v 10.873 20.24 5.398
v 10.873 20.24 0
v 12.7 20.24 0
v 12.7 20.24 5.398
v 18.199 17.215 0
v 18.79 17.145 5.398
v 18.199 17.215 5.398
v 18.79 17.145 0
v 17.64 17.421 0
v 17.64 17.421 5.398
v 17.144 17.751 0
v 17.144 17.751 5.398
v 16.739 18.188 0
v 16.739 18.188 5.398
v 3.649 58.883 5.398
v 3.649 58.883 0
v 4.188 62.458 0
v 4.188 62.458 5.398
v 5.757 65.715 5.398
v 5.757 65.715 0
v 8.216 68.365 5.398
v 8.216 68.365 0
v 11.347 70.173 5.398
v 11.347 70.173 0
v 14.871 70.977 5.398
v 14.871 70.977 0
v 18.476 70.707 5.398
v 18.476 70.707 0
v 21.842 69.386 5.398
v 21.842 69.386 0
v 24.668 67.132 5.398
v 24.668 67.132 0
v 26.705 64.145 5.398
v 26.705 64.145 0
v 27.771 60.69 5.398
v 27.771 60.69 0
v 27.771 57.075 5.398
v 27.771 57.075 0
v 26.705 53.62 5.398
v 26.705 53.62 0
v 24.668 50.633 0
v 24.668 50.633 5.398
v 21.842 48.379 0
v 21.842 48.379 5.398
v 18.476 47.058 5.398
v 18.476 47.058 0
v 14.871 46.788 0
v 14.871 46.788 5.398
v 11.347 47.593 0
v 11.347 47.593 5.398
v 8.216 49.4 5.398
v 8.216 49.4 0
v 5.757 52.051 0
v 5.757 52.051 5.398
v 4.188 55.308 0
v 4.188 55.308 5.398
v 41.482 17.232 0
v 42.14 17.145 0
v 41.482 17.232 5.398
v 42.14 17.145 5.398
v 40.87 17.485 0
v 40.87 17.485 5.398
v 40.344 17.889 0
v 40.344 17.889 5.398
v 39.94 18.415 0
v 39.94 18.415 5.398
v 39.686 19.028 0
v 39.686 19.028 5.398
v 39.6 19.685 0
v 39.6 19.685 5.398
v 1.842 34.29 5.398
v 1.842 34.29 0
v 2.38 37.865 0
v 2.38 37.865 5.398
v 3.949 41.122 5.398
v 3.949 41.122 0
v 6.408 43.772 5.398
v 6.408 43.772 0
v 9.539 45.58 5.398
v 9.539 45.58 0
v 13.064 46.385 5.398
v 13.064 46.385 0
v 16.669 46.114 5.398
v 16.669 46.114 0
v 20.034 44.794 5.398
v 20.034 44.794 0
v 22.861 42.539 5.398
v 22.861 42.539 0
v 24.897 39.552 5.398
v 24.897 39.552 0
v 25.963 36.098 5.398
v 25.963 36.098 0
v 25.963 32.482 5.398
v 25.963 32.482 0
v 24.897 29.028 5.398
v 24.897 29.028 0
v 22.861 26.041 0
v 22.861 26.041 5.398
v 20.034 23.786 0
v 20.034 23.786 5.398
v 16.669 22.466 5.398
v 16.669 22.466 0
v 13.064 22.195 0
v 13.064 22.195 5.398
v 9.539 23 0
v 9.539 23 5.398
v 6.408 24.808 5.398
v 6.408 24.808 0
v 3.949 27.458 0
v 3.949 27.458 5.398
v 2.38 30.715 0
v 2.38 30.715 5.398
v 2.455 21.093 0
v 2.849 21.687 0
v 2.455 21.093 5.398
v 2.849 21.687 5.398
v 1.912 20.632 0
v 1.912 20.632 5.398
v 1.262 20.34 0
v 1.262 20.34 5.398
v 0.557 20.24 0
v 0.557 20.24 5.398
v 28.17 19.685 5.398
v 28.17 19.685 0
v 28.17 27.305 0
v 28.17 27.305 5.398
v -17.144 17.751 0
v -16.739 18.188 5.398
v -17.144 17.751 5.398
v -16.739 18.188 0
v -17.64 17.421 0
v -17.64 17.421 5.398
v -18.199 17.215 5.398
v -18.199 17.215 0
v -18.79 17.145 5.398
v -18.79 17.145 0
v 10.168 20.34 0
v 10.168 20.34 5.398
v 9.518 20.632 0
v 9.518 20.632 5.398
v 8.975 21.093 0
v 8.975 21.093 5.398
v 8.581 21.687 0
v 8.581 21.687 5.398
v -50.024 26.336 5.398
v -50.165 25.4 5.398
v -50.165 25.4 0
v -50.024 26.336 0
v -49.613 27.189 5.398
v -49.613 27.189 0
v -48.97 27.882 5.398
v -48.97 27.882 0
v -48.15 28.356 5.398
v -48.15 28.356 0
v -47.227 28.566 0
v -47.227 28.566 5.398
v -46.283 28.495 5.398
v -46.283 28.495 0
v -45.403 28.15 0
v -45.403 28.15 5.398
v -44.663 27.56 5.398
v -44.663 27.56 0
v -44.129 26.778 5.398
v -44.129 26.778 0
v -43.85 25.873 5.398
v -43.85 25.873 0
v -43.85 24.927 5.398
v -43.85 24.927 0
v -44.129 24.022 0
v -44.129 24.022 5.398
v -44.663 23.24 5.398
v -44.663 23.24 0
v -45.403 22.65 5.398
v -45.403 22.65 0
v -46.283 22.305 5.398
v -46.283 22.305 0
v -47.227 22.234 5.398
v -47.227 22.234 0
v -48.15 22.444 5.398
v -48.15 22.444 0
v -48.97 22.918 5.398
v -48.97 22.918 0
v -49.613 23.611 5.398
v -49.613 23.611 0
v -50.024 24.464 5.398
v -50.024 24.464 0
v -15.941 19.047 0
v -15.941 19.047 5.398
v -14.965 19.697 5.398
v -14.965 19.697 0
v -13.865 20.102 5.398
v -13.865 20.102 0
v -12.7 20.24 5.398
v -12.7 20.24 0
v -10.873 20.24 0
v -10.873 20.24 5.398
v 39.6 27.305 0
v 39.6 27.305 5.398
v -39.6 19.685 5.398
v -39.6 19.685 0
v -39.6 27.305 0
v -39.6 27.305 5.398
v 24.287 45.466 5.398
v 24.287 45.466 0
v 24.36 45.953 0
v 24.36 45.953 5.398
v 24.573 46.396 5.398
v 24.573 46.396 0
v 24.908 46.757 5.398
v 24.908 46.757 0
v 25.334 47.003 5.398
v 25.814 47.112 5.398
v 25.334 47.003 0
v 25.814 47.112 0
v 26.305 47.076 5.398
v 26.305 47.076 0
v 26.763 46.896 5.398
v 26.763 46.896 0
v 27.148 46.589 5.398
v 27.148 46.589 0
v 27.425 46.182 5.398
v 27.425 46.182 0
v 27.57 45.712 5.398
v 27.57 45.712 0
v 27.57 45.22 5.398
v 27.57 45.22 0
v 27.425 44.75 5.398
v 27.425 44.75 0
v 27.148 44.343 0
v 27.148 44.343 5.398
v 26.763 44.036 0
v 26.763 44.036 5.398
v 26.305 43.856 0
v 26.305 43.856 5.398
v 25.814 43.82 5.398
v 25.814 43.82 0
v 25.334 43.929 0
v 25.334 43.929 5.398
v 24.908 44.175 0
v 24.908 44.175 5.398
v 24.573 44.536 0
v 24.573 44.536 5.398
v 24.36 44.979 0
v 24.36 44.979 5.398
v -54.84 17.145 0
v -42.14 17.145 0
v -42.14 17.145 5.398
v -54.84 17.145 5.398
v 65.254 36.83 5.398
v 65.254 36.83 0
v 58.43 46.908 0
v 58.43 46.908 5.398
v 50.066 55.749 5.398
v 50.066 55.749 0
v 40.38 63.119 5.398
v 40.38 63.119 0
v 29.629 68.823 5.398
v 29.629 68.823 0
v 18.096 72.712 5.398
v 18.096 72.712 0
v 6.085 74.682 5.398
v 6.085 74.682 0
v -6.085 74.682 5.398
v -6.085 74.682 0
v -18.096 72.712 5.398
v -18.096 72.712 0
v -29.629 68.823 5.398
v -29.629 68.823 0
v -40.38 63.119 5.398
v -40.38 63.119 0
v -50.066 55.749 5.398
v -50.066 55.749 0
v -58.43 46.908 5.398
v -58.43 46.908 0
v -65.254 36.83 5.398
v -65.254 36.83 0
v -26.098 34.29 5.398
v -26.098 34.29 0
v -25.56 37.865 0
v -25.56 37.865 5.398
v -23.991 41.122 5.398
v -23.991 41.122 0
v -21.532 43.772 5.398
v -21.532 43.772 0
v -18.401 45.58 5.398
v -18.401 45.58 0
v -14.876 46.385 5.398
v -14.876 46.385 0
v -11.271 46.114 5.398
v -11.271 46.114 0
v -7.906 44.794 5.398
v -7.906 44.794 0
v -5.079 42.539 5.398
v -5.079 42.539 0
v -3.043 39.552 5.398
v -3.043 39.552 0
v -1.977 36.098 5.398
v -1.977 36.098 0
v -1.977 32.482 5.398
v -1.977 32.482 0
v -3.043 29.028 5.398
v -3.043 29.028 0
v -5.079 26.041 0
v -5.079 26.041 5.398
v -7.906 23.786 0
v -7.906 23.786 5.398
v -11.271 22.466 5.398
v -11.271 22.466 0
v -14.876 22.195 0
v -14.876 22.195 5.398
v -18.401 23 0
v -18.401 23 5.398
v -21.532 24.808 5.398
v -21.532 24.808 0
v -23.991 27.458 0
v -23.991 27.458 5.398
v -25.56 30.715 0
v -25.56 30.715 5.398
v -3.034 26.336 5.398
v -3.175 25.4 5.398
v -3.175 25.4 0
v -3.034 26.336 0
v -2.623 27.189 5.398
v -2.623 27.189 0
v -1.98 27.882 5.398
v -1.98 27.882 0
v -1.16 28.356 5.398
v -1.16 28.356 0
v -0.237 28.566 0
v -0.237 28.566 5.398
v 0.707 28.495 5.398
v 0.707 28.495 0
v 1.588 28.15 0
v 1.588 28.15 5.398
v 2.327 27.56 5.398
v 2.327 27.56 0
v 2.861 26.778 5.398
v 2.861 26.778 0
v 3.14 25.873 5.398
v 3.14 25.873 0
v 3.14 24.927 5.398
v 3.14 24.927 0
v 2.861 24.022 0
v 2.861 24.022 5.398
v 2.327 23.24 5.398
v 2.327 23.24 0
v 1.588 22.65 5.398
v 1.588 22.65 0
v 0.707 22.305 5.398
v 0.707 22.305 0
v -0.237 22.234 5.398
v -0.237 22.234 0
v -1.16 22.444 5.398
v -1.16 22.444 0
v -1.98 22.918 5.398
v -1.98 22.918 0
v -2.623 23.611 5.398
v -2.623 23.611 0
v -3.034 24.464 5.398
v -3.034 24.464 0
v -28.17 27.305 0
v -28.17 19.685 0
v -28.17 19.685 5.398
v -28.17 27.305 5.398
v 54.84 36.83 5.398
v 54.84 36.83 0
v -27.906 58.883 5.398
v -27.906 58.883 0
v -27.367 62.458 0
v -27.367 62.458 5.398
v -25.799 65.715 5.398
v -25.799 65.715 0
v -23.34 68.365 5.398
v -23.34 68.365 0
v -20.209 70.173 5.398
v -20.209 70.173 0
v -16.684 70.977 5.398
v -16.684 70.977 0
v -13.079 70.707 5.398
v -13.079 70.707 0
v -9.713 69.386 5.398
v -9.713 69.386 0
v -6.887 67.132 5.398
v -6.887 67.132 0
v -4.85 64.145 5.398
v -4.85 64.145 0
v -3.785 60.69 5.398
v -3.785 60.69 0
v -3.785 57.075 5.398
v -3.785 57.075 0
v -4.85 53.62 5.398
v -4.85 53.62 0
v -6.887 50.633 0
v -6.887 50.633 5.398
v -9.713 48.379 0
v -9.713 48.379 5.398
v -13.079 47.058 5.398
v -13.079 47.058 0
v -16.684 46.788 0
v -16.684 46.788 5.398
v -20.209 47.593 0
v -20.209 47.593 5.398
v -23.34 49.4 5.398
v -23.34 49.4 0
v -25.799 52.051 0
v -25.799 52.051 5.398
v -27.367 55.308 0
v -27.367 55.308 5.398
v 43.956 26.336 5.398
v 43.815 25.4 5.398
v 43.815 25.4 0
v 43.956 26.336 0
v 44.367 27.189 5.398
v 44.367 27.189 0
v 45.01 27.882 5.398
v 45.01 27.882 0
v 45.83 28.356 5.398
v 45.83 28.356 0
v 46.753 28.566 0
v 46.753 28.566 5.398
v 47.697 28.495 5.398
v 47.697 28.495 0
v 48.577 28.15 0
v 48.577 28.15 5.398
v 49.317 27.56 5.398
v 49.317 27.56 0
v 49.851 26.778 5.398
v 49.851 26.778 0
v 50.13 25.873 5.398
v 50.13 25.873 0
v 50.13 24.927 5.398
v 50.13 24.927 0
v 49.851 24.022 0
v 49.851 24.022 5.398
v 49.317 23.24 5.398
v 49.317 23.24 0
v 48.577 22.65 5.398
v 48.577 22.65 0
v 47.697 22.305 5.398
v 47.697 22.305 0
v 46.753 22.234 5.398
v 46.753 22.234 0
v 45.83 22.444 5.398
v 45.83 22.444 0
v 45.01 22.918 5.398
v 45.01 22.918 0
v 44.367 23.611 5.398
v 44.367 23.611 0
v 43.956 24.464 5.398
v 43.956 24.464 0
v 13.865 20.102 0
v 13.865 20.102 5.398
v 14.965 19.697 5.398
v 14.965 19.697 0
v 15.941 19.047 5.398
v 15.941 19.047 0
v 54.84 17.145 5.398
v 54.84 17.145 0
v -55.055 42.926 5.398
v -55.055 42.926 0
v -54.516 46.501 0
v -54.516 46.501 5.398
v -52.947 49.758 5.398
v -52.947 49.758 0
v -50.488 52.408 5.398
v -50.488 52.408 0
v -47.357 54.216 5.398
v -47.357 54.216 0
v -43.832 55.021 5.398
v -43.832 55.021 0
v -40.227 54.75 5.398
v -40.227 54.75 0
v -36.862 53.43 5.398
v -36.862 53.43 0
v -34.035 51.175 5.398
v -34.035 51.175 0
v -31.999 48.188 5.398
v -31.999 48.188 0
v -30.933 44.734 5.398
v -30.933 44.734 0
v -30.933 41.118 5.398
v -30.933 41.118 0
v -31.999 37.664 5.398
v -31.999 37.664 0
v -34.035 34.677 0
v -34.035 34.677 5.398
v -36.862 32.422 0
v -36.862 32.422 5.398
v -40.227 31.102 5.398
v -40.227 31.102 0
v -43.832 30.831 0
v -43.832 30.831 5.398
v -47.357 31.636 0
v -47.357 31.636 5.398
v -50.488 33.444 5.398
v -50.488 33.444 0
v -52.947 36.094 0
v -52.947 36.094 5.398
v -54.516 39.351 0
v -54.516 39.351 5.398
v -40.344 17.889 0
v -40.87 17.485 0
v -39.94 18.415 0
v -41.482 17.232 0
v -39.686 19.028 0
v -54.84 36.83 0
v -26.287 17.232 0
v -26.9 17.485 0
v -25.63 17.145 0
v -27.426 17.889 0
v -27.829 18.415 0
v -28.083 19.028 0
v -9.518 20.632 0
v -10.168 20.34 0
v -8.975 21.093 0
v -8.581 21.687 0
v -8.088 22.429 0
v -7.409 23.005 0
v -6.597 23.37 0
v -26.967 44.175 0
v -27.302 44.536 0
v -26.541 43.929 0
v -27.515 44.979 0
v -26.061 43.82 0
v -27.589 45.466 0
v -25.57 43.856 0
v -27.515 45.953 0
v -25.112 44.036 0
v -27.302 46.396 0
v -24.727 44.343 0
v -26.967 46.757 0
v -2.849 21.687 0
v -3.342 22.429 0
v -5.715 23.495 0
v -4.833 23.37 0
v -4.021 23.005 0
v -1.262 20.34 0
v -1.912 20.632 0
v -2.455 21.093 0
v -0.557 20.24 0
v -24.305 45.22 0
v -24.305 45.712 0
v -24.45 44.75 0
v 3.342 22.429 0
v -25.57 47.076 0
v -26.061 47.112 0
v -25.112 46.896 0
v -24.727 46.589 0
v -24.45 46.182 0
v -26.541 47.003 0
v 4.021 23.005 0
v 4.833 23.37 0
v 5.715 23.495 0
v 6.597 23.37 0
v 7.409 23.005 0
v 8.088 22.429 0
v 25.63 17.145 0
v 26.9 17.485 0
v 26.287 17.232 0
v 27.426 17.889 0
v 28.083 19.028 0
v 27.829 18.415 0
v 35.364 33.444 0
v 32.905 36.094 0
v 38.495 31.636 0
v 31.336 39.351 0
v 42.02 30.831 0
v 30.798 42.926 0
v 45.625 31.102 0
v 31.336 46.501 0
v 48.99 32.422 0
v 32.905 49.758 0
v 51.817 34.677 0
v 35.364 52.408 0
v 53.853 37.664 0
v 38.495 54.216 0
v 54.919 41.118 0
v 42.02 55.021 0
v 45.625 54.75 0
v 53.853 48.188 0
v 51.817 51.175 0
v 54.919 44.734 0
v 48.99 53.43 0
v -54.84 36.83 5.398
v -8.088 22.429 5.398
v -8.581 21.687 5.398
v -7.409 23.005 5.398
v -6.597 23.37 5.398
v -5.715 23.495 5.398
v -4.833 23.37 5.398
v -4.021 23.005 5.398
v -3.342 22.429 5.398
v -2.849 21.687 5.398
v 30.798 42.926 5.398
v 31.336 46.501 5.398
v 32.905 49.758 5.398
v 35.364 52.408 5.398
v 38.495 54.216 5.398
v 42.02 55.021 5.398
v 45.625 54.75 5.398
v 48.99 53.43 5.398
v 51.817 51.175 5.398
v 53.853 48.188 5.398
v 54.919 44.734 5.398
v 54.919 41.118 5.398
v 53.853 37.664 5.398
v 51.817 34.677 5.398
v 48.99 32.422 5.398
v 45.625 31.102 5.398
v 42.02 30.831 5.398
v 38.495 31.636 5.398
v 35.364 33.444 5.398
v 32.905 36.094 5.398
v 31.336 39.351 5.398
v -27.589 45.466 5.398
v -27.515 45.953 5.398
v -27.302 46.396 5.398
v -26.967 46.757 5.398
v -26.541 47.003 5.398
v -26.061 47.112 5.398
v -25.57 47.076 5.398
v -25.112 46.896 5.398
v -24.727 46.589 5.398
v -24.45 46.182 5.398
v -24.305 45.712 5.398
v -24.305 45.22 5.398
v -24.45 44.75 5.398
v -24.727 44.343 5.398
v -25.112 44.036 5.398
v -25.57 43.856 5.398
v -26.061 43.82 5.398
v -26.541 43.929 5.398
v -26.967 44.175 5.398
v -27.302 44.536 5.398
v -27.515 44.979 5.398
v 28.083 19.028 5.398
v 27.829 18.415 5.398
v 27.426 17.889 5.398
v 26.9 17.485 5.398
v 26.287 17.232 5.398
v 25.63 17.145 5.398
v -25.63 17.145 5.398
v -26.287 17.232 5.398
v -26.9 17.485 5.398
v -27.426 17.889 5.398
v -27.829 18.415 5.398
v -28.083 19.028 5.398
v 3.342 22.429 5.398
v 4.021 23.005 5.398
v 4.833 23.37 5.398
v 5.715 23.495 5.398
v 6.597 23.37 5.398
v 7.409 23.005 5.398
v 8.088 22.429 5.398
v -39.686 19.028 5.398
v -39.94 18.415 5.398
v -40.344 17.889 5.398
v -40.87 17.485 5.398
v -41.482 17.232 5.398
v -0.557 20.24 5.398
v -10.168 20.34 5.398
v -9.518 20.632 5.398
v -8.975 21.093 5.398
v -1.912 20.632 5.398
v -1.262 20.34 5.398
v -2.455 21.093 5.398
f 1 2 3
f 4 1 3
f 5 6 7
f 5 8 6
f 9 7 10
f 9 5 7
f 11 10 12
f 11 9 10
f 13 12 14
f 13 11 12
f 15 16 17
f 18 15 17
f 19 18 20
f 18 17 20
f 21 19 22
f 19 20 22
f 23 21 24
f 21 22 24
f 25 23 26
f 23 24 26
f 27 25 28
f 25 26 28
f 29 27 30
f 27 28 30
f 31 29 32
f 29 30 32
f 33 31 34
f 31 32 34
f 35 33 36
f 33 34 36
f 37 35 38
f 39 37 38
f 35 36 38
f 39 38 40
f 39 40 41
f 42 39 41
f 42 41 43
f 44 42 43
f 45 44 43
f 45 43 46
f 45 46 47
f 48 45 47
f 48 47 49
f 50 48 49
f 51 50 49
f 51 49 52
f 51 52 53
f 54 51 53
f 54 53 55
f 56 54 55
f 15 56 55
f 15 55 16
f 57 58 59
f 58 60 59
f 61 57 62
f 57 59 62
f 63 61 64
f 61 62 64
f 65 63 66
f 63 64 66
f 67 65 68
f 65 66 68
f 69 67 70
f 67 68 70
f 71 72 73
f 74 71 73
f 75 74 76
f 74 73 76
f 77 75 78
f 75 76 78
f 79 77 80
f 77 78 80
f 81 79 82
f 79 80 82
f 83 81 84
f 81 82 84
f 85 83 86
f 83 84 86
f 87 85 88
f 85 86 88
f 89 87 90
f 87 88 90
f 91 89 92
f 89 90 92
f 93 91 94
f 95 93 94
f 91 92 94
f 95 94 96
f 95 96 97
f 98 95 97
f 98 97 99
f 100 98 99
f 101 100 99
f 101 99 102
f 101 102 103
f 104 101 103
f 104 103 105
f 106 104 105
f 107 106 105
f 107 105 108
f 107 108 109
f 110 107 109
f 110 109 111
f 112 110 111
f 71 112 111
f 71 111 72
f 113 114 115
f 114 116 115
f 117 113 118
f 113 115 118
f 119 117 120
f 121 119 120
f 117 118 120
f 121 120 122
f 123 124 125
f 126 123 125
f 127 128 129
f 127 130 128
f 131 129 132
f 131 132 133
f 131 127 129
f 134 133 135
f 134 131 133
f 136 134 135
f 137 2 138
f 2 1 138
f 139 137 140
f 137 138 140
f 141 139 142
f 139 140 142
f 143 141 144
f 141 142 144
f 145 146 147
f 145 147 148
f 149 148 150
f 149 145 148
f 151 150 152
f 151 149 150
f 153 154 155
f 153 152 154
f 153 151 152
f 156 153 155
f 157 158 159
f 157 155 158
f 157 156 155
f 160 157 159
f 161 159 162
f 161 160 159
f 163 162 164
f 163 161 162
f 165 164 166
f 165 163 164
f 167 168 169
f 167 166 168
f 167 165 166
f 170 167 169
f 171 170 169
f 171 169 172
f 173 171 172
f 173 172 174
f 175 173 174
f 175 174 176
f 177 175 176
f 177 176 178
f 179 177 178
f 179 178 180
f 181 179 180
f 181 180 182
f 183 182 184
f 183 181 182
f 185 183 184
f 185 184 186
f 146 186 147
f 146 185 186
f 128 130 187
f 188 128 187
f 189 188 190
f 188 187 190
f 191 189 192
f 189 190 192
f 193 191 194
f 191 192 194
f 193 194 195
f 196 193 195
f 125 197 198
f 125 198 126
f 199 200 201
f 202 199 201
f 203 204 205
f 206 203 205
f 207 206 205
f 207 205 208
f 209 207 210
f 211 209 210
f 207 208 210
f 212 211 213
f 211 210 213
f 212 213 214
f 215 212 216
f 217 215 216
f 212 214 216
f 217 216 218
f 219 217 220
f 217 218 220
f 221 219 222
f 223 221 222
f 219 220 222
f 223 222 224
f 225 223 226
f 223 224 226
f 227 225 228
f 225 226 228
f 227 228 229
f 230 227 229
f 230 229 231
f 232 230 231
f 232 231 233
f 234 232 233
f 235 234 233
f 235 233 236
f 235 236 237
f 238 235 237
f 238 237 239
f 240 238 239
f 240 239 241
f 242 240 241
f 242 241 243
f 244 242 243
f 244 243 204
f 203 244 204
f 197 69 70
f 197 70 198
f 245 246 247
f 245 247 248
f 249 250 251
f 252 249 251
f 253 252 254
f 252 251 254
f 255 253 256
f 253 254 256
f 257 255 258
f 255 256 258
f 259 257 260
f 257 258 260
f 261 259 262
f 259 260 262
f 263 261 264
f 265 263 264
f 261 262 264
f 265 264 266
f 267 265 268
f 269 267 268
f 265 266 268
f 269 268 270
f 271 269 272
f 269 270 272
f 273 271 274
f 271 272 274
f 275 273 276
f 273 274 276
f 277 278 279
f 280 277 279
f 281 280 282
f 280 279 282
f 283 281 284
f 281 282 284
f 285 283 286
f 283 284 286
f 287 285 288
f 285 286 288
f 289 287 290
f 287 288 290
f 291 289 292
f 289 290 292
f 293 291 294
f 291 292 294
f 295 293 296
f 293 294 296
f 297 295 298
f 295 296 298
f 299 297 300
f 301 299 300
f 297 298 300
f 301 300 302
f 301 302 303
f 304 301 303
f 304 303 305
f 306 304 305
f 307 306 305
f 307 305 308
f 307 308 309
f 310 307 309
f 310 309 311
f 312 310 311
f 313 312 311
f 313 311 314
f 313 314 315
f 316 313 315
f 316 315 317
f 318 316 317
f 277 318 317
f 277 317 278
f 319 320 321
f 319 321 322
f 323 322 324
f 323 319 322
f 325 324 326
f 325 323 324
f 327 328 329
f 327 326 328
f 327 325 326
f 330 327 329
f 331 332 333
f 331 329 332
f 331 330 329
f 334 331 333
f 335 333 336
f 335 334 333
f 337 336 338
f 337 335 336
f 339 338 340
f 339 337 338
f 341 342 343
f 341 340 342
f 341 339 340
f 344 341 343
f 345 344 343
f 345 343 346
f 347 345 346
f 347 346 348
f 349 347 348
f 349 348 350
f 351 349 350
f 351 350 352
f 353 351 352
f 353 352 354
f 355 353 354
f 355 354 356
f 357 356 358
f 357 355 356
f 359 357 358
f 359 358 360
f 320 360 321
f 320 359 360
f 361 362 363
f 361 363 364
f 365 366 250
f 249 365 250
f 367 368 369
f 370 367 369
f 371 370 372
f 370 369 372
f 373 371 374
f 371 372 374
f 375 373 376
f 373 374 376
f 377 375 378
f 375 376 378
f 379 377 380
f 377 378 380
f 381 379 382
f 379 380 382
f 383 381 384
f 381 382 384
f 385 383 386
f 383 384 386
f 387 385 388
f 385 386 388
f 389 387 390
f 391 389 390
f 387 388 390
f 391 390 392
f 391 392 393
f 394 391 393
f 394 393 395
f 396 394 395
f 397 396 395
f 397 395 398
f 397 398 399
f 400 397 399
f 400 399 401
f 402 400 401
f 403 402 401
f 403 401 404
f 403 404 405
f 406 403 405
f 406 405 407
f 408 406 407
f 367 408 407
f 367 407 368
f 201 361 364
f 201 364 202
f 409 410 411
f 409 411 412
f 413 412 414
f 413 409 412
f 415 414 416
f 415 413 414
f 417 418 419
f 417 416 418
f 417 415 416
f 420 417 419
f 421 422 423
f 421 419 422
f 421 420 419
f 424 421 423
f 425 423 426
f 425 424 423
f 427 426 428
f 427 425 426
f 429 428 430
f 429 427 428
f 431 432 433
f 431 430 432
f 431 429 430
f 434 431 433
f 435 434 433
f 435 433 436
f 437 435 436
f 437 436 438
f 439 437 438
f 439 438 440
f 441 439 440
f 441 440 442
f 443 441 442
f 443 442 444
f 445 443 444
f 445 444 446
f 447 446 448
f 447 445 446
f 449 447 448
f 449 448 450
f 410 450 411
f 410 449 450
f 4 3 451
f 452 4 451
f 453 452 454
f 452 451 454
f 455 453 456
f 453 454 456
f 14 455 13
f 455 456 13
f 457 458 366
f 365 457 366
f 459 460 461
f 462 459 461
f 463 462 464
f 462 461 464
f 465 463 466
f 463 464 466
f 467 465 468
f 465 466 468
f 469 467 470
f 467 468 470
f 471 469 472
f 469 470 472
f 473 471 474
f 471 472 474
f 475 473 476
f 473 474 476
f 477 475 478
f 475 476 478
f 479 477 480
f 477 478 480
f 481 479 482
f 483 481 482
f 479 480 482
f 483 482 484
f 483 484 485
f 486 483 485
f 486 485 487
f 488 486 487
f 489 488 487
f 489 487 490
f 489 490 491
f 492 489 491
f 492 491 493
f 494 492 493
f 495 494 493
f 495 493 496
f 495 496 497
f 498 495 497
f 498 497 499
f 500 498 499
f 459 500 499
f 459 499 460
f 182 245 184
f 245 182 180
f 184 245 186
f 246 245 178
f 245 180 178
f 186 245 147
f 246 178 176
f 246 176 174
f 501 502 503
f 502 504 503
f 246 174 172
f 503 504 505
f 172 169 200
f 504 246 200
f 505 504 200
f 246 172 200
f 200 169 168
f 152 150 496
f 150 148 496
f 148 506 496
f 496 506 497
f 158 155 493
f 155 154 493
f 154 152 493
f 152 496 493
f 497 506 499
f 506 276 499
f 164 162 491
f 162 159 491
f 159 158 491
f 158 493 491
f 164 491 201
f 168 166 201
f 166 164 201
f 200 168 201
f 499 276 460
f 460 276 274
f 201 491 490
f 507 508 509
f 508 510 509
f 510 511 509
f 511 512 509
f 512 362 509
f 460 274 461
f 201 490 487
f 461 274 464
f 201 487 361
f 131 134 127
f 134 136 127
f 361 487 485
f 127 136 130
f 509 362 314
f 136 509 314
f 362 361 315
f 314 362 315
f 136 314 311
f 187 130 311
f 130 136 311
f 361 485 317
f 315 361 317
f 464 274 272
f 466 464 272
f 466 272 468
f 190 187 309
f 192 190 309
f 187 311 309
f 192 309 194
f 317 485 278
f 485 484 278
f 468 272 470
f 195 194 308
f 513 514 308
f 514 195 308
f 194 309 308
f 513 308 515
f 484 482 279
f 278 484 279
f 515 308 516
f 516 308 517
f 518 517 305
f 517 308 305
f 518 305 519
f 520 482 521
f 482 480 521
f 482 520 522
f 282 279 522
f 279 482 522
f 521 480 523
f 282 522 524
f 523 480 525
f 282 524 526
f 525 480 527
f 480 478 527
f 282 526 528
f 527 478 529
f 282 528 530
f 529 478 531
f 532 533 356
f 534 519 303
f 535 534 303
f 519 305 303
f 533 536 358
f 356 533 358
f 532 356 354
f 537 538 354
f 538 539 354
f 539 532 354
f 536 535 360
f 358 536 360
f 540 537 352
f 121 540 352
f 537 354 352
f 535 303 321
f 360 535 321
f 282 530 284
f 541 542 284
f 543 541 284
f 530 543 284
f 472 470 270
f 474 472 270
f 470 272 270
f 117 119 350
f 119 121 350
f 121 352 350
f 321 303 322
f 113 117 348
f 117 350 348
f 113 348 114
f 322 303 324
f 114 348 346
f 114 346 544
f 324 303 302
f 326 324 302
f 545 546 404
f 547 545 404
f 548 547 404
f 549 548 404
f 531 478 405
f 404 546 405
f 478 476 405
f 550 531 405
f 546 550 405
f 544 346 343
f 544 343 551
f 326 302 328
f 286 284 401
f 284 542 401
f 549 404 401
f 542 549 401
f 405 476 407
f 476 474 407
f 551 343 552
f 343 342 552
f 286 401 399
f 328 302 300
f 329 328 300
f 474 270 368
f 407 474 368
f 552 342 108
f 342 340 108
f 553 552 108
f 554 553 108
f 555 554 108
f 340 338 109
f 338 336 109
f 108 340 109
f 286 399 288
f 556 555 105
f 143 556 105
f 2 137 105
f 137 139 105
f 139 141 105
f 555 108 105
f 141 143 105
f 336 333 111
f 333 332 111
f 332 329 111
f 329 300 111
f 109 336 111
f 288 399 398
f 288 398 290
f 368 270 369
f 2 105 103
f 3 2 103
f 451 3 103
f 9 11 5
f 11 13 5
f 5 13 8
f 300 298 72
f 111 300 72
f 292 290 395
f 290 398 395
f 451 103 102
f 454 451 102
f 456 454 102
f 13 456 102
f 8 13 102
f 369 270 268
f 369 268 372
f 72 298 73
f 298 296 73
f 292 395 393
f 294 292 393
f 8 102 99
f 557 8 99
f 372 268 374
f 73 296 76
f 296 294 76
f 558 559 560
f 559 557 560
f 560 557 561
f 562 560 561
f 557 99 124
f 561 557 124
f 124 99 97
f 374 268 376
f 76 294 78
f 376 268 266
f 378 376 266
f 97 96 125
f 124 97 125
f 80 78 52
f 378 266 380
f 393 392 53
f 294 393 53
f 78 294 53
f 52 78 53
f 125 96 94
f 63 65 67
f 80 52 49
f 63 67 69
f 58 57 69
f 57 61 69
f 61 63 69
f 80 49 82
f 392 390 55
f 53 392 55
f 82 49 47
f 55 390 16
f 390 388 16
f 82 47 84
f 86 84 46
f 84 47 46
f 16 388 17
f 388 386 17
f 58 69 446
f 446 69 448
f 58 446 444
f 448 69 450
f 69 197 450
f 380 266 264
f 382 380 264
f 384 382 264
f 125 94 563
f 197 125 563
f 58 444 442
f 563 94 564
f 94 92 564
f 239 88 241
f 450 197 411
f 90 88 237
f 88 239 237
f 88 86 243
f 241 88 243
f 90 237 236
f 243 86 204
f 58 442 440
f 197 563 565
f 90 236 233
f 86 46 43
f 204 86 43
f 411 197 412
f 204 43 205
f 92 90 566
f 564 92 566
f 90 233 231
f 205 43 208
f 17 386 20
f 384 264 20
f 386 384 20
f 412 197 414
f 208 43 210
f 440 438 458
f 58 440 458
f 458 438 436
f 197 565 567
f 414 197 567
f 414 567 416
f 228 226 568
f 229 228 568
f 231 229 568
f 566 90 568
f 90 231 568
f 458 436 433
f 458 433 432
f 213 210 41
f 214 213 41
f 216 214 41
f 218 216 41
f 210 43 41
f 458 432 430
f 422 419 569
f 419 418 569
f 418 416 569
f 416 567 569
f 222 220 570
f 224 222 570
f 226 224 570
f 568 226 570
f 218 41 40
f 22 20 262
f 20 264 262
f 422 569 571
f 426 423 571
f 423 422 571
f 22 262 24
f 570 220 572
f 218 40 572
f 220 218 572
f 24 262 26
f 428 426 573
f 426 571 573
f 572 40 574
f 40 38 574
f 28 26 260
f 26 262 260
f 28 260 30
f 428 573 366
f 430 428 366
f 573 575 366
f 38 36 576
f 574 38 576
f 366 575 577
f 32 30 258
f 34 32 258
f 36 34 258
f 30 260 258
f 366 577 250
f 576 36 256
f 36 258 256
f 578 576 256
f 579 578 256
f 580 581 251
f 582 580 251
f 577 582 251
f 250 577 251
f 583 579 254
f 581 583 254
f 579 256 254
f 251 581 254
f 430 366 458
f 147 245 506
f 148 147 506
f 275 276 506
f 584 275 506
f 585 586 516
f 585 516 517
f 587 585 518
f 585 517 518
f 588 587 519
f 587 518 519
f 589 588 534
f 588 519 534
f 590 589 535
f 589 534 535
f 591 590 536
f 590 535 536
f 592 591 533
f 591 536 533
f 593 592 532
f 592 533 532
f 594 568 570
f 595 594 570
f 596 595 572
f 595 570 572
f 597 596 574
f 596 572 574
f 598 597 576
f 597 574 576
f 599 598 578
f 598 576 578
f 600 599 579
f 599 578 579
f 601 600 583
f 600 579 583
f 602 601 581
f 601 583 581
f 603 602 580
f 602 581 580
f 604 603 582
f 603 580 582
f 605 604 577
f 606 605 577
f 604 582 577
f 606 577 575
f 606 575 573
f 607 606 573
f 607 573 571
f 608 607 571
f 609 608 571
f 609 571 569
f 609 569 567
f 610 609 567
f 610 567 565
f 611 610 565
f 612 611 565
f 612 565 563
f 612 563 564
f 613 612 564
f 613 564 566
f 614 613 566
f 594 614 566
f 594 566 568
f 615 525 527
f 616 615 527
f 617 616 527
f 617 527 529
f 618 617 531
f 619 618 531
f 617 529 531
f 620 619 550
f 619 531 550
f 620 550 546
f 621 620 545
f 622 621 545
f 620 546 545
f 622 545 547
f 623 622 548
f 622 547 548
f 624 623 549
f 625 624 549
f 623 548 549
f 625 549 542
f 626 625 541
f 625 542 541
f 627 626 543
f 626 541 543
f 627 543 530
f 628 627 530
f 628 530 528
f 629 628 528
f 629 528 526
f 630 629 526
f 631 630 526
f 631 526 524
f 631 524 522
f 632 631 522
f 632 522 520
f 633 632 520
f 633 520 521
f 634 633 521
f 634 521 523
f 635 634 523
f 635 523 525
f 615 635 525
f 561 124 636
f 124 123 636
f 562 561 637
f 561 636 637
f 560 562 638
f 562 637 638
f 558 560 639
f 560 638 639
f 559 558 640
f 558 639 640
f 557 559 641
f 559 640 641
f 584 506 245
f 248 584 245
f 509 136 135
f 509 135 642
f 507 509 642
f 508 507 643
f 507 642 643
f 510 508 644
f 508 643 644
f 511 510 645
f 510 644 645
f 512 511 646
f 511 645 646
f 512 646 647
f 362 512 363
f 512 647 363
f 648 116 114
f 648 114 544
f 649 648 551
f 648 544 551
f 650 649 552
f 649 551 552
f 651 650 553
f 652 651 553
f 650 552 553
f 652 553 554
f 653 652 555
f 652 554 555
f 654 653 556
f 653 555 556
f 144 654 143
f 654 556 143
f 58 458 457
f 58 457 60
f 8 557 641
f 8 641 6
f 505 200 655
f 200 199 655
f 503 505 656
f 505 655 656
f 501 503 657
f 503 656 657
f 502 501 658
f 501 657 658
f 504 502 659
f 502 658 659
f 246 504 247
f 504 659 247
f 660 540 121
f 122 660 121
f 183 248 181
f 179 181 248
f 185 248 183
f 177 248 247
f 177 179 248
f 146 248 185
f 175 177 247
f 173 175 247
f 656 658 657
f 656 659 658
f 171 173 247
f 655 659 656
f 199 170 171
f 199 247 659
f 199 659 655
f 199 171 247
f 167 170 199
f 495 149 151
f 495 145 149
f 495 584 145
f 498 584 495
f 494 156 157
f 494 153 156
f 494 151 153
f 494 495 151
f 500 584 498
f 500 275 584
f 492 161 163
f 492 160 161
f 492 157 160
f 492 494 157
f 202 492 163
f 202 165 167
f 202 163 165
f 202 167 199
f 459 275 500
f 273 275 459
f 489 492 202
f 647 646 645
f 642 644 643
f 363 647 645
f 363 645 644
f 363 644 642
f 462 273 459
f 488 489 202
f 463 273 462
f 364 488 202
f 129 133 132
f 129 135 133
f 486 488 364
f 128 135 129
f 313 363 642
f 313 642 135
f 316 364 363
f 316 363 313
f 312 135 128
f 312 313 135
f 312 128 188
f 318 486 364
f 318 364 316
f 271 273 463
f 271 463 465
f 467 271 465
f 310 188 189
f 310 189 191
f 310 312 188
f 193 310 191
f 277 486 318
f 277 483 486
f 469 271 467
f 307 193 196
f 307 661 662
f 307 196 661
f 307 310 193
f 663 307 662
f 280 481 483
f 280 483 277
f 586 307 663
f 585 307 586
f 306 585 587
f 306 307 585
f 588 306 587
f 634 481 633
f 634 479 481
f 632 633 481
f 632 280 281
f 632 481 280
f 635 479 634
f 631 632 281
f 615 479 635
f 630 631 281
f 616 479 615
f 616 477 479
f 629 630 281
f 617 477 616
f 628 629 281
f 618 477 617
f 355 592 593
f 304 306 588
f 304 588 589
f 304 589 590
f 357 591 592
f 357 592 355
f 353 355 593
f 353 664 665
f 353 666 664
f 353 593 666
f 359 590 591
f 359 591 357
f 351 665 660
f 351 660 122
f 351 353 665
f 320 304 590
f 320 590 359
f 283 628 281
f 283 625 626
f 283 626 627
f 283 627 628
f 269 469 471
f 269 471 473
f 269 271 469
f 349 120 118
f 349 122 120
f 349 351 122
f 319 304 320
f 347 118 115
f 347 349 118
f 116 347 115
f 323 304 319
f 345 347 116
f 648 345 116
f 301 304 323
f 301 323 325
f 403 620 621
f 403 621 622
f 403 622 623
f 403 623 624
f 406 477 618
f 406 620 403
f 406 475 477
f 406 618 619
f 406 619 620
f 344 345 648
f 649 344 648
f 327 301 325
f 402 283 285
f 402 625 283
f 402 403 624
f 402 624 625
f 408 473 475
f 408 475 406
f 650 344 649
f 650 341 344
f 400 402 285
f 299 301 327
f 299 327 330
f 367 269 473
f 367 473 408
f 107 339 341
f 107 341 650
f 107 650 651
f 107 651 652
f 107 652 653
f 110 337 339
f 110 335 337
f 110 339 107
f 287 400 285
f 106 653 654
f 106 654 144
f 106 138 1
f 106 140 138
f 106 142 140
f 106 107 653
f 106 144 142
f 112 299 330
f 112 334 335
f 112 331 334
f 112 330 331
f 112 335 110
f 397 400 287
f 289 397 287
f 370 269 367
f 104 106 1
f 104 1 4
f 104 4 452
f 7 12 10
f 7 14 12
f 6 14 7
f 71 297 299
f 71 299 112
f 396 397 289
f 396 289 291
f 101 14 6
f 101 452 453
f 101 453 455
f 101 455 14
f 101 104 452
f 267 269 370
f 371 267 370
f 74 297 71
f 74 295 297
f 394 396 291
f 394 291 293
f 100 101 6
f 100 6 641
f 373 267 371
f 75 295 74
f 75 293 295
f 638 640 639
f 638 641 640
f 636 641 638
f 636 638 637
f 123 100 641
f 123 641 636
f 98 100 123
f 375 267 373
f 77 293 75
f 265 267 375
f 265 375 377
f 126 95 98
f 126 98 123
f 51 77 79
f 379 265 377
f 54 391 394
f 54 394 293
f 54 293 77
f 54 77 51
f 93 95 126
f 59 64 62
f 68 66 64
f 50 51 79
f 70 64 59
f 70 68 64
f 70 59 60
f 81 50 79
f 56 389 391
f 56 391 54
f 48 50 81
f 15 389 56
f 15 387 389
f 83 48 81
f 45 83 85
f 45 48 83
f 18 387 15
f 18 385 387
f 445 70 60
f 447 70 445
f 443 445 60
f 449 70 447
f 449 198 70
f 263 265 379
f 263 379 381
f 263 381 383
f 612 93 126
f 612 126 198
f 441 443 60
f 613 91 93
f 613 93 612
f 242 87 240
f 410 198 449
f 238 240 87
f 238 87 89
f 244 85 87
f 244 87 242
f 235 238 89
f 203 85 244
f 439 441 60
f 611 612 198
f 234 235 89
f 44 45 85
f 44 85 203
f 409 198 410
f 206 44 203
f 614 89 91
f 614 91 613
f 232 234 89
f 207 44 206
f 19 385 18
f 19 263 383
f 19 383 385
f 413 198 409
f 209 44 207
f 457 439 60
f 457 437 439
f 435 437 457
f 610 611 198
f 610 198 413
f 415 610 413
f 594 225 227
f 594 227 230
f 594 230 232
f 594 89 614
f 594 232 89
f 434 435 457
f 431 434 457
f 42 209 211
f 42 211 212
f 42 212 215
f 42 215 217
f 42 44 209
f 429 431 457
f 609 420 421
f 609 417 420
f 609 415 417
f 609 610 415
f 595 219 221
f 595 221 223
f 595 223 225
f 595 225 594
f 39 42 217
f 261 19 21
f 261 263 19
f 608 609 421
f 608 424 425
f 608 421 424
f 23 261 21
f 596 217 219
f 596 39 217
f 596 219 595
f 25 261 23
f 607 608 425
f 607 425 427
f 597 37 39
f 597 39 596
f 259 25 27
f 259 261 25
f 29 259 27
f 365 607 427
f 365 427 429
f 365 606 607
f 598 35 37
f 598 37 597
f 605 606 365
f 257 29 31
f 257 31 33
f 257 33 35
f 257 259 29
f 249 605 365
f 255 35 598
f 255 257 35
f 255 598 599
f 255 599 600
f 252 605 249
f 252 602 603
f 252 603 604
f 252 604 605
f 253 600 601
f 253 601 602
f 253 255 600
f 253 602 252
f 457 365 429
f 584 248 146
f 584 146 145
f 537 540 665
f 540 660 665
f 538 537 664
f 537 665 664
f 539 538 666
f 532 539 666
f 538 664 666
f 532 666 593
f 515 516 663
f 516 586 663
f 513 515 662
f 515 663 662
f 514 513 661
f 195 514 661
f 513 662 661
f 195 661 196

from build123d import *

# Parameters (mm, degrees)
SKETCH1_R                 = 1.651
BOSS_EXTRUDE2_DEPTH       = 5.3975
SKETCH2_R                 = 1.143
CUT_EXTRUDE1_DEPTH        = 6.3975
SKETCH3_R                 = 12.1285
CUT_EXTRUDE2_DEPTH        = 6.3975
SKETCH4_W                 = 28.562713242
SKETCH4_H                 = 11.677503754
BOSS_EXTRUDE3_DEPTH       = 5.3975
SKETCH5_W                 = 230.699333954
SKETCH5_H                 = 107.587024537
CUT_EXTRUDE3_DEPTH        = 6.3975
SKETCH6_R                 = 12.1285
CUT_EXTRUDE4_DEPTH        = 6.3975
SKETCH156_W               = 11.43
SKETCH156_H               = 10.16
CUT_EXTRUDE152_DEPTH      = 6.3975
SKETCH212_R               = 1.651
CUT_EXTRUDE208_DEPTH      = 97.79
SKETCH266_R               = 3.175
CUT_EXTRUDE262_DEPTH      = 103.378
CUT_EXTRUDE262_DEPTH_BACK = 48.768
CUT_EXTRUDE155_DEPTH      = 26.162
FILLET1_R                 = 2.54


with BuildPart() as part:
    # Sketch1 → Boss-Extrude2 (new body)
    with BuildSketch(Plane.XY):
        with BuildLine():
            Line((-65.2537815, 36.83), (-54.8397815, 36.83))
            Line((-54.8397815, 36.83), (-54.8397815, -36.83))
            Line((-54.8397815, -36.83), (-65.2537815, -36.83))
            ThreePointArc((-65.2537815, -36.83), (0, -74.93), (65.2537815, -36.83))
            Line((65.2537815, -36.83), (54.8397815, -36.83))
            Line((54.8397815, -36.83), (54.8397815, 36.83))
            Line((54.8397815, 36.83), (65.2537815, 36.83))
            ThreePointArc((65.2537815, 36.83), (0, 74.93), (-65.2537815, 36.83))
        make_face()
        with Locations((-45.466, 11.049)):
            Circle(SKETCH1_R, mode=Mode.SUBTRACT)
        with Locations((-20.067270032, 10.795)):
            Circle(SKETCH1_R, mode=Mode.SUBTRACT)
        with Locations((-20.067270032, -10.795)):
            Circle(SKETCH1_R, mode=Mode.SUBTRACT)
        with Locations((-45.466, -11.049)):
            Circle(SKETCH1_R, mode=Mode.SUBTRACT)
        with Locations((45.466, -11.049)):
            Circle(SKETCH1_R, mode=Mode.SUBTRACT)
        with Locations((20.067270032, -10.795)):
            Circle(SKETCH1_R, mode=Mode.SUBTRACT)
        with Locations((20.067270032, 10.795)):
            Circle(SKETCH1_R, mode=Mode.SUBTRACT)
        with Locations((45.466, 11.049)):
            Circle(SKETCH1_R, mode=Mode.SUBTRACT)
    extrude(amount=BOSS_EXTRUDE2_DEPTH)

    # Sketch2 → Cut-Extrude1 (cut, through all)
    with BuildSketch(Plane.XY.offset(5.3975)):
        with Locations((-6.731, 62.23)):
            Circle(SKETCH2_R)
        with Locations((6.731, 62.23)):
            Circle(SKETCH2_R)
    extrude(amount=-CUT_EXTRUDE1_DEPTH, mode=Mode.SUBTRACT)

    # Sketch3 → Cut-Extrude2 (cut, through all)
    with BuildSketch(Plane(origin=(0, 0, 0), x_dir=(-1, 0, 0), z_dir=(0, 0, -1))):
        with Locations((-42.926, -42.926)):
            Circle(SKETCH3_R)
        with Locations((13.97, -34.29)):
            Circle(SKETCH3_R)
        with Locations((13.97, 34.29)):
            Circle(SKETCH3_R)
        with Locations((-42.926, 42.926)):
            Circle(SKETCH3_R)
        with Locations((42.926, 42.926)):
            Circle(SKETCH3_R)
        with Locations((-13.97, 34.29)):
            Circle(SKETCH3_R)
        with Locations((-13.97, -34.29)):
            Circle(SKETCH3_R)
        with Locations((42.926, -42.926)):
            Circle(SKETCH3_R)
    extrude(amount=-CUT_EXTRUDE2_DEPTH, mode=Mode.SUBTRACT)

    # Sketch4 → Boss-Extrude3 (add)
    with BuildSketch(Plane(origin=(0, 0, 0), x_dir=(-1, 0, 0), z_dir=(0, 0, -1))):
        with Locations((-1.488809975, 62.152540216)):
            Rectangle(SKETCH4_W, SKETCH4_H)
    extrude(amount=-BOSS_EXTRUDE3_DEPTH)

    # Sketch5 → Cut-Extrude3 (cut, through all)
    with BuildSketch(Plane(origin=(0, 0, 0), x_dir=(-1, 0, 0), z_dir=(0, 0, -1))):
        with Locations((1.971047261, -36.648512269)):
            Rectangle(SKETCH5_W, SKETCH5_H)
    extrude(amount=-CUT_EXTRUDE3_DEPTH, mode=Mode.SUBTRACT)

    # Sketch6 → Cut-Extrude4 (cut, through all)
    with BuildSketch(Plane(origin=(0, 0, 0), x_dir=(-1, 0, 0), z_dir=(0, 0, -1))):
        with Locations((-15.777608989, 58.882838371)):
            Circle(SKETCH6_R)
        with Locations((15.777608989, 58.882838371)):
            Circle(SKETCH6_R)
    extrude(amount=-CUT_EXTRUDE4_DEPTH, mode=Mode.SUBTRACT)

    # Sketch156 → Cut-Extrude152 (cut, through all)
    with BuildSketch(Plane(origin=(0, 0, 0), x_dir=(-1, 0, 0), z_dir=(0, 0, -1))):
        with Locations((33.8847815, 22.225)):
            Rectangle(SKETCH156_W, SKETCH156_H)
        with Locations((-33.8847815, 22.225)):
            Rectangle(SKETCH156_W, SKETCH156_H)
    extrude(amount=-CUT_EXTRUDE152_DEPTH, mode=Mode.SUBTRACT)

    # Sketch212 → Cut-Extrude208 (cut)
    with BuildSketch(Plane(origin=(30.092005081, 4.08352975, -19.2405), x_dir=(-1, 0, 0), z_dir=(0, 0, -1))):
        with Locations((4.154396091, 41.38247025)):
            Circle(SKETCH212_R)
        with Locations((56.02961407, 41.38247025)):
            Circle(SKETCH212_R)
    extrude(amount=-CUT_EXTRUDE208_DEPTH, mode=Mode.SUBTRACT)

    # Sketch266 → Cut-Extrude262 (cut, two sides)
    with BuildSketch(Plane(origin=(30.092005081, 4.08352975, 16.891), x_dir=(-1, 0, 0), z_dir=(0, 0, -1))) as cut_extrude262_sk:
        with Locations((-16.897994919, 21.31647025)):
            Circle(SKETCH266_R)
        with Locations((77.082005081, 21.31647025)):
            Circle(SKETCH266_R)
        with Locations((30.092005081, 21.31647025)):
            Circle(SKETCH266_R)
    extrude(amount=CUT_EXTRUDE262_DEPTH, mode=Mode.SUBTRACT)
    extrude(cut_extrude262_sk.sketch, amount=-CUT_EXTRUDE262_DEPTH_BACK, mode=Mode.SUBTRACT)

    # Sketch159 → Cut-Extrude155 (cut)
    with BuildSketch(Plane(origin=(0, 0, 0), x_dir=(-1, 0, 0), z_dir=(0, 0, -1))):
        with BuildLine():
            Line((12.7, 20.24), (8.888991966, 20.24))
            ThreePointArc((8.888991966, 20.24), (5.715, 23.495), (2.541008034, 20.24))
            Line((2.541008034, 20.24), (-2.541008034, 20.24))
            ThreePointArc((-2.541008034, 20.24), (-5.715, 23.495), (-8.888991966, 20.24))
            Line((-8.888991966, 20.24), (-12.7, 20.24))
            ThreePointArc((-12.7, 20.24), (-16.235533906, 11.704466094), (-7.7, 15.24))
            Line((-7.7, 15.24), (7.7, 15.24))
            ThreePointArc((7.7, 15.24), (16.235533906, 11.704466094), (12.7, 20.24))
        make_face()
    extrude(amount=-CUT_EXTRUDE155_DEPTH, mode=Mode.SUBTRACT)

    # Fillet1
    fillet1_edges = [part.edges().sort_by_distance(p)[0] for p in [
        (-39.5997815, 17.145, 2.69875),
        (-28.1697815, 17.145, 2.69875),
        (28.1697815, 17.145, 2.69875),
        (39.5997815, 17.145, 2.69875),
        (-17.322875188, 17.145, 2.69875),
        (17.322875188, 17.145, 2.69875),
        (8.888991966, 20.24, 2.69875),
        (2.541008034, 20.24, 2.69875),
        (-2.541008034, 20.24, 2.69875),
        (-8.888991966, 20.24, 2.69875),
    ]]
    fillet(fillet1_edges, radius=FILLET1_R)


solid = part.part
